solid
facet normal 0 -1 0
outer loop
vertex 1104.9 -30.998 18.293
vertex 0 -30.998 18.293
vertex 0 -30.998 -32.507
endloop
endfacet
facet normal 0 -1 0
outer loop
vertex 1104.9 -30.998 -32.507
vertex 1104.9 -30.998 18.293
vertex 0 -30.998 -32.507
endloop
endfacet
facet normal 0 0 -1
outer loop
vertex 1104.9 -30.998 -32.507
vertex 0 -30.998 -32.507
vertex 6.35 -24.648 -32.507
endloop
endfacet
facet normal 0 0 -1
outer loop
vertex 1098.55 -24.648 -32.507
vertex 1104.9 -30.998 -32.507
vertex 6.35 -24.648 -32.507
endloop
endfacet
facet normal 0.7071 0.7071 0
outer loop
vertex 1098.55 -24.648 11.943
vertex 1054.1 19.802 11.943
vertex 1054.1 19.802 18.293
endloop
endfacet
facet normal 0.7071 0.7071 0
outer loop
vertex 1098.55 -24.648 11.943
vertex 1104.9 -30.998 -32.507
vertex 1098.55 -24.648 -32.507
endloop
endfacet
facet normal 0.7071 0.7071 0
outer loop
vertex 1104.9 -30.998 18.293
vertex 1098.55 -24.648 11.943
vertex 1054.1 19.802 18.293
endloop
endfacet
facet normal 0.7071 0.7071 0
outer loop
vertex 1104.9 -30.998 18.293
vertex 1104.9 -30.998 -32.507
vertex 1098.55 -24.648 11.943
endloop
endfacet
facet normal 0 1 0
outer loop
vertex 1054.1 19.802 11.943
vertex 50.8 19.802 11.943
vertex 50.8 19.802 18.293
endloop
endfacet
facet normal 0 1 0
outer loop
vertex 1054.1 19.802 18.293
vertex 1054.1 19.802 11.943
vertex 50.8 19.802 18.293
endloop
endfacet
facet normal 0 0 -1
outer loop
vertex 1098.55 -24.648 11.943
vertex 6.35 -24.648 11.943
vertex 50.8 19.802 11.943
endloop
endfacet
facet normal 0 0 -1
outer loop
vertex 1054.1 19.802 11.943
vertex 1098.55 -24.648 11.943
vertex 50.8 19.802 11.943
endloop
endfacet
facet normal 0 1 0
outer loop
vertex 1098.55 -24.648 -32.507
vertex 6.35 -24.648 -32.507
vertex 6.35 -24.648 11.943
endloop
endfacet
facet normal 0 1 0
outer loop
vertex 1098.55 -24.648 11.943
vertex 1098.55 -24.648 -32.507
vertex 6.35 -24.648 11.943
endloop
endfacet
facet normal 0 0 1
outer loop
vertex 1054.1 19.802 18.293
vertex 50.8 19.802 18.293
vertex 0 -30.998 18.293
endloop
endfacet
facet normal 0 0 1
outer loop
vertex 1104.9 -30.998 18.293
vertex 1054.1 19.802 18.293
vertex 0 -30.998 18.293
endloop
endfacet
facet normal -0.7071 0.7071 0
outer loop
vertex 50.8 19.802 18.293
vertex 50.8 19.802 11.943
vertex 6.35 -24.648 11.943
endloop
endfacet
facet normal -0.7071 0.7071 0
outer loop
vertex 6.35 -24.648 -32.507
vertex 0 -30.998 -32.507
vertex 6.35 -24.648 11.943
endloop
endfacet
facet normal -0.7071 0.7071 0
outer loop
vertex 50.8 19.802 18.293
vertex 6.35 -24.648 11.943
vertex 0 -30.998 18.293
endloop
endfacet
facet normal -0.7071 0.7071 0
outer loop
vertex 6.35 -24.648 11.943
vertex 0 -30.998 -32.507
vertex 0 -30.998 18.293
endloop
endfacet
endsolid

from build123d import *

# Parameters (mm, degrees)
F1_DEPTH = 1104.9
F2_SIZE2 = 50.79999
F2_SIZE  = 50.79999


# Not quite as in the source:
# - a fillet or chamfer is up to 0.001 mm smaller than in the source, because OpenCascade refuses the exact size


with BuildPart() as f1:
    # F0 (on Right) → F1 (new body)
    with BuildSketch(Plane.YZ):
        Polygon((-30.9975855052, -32.5072072446), (-24.6475855052, -32.5072072446), (-24.6475855052, 11.9427927554), (19.8024144948, 11.9427927554), (19.8024144948, 18.2927927554), (-30.9975855052, 18.2927927554), align=None)
    extrude(amount=F1_DEPTH)

    # F2 (size 50.8 and 50.8 in the source; OpenCascade refuses exactly that, so slightly less here)
    f2_edges = [f1.edges().sort_by_distance(p)[0] for p in [
        (1104.9, 19.802414, 15.117793),
        (0, 19.802414, 15.117793),
    ]]
    chamfer(f2_edges, length=F2_SIZE, length2=F2_SIZE2)


solid = f1.part
